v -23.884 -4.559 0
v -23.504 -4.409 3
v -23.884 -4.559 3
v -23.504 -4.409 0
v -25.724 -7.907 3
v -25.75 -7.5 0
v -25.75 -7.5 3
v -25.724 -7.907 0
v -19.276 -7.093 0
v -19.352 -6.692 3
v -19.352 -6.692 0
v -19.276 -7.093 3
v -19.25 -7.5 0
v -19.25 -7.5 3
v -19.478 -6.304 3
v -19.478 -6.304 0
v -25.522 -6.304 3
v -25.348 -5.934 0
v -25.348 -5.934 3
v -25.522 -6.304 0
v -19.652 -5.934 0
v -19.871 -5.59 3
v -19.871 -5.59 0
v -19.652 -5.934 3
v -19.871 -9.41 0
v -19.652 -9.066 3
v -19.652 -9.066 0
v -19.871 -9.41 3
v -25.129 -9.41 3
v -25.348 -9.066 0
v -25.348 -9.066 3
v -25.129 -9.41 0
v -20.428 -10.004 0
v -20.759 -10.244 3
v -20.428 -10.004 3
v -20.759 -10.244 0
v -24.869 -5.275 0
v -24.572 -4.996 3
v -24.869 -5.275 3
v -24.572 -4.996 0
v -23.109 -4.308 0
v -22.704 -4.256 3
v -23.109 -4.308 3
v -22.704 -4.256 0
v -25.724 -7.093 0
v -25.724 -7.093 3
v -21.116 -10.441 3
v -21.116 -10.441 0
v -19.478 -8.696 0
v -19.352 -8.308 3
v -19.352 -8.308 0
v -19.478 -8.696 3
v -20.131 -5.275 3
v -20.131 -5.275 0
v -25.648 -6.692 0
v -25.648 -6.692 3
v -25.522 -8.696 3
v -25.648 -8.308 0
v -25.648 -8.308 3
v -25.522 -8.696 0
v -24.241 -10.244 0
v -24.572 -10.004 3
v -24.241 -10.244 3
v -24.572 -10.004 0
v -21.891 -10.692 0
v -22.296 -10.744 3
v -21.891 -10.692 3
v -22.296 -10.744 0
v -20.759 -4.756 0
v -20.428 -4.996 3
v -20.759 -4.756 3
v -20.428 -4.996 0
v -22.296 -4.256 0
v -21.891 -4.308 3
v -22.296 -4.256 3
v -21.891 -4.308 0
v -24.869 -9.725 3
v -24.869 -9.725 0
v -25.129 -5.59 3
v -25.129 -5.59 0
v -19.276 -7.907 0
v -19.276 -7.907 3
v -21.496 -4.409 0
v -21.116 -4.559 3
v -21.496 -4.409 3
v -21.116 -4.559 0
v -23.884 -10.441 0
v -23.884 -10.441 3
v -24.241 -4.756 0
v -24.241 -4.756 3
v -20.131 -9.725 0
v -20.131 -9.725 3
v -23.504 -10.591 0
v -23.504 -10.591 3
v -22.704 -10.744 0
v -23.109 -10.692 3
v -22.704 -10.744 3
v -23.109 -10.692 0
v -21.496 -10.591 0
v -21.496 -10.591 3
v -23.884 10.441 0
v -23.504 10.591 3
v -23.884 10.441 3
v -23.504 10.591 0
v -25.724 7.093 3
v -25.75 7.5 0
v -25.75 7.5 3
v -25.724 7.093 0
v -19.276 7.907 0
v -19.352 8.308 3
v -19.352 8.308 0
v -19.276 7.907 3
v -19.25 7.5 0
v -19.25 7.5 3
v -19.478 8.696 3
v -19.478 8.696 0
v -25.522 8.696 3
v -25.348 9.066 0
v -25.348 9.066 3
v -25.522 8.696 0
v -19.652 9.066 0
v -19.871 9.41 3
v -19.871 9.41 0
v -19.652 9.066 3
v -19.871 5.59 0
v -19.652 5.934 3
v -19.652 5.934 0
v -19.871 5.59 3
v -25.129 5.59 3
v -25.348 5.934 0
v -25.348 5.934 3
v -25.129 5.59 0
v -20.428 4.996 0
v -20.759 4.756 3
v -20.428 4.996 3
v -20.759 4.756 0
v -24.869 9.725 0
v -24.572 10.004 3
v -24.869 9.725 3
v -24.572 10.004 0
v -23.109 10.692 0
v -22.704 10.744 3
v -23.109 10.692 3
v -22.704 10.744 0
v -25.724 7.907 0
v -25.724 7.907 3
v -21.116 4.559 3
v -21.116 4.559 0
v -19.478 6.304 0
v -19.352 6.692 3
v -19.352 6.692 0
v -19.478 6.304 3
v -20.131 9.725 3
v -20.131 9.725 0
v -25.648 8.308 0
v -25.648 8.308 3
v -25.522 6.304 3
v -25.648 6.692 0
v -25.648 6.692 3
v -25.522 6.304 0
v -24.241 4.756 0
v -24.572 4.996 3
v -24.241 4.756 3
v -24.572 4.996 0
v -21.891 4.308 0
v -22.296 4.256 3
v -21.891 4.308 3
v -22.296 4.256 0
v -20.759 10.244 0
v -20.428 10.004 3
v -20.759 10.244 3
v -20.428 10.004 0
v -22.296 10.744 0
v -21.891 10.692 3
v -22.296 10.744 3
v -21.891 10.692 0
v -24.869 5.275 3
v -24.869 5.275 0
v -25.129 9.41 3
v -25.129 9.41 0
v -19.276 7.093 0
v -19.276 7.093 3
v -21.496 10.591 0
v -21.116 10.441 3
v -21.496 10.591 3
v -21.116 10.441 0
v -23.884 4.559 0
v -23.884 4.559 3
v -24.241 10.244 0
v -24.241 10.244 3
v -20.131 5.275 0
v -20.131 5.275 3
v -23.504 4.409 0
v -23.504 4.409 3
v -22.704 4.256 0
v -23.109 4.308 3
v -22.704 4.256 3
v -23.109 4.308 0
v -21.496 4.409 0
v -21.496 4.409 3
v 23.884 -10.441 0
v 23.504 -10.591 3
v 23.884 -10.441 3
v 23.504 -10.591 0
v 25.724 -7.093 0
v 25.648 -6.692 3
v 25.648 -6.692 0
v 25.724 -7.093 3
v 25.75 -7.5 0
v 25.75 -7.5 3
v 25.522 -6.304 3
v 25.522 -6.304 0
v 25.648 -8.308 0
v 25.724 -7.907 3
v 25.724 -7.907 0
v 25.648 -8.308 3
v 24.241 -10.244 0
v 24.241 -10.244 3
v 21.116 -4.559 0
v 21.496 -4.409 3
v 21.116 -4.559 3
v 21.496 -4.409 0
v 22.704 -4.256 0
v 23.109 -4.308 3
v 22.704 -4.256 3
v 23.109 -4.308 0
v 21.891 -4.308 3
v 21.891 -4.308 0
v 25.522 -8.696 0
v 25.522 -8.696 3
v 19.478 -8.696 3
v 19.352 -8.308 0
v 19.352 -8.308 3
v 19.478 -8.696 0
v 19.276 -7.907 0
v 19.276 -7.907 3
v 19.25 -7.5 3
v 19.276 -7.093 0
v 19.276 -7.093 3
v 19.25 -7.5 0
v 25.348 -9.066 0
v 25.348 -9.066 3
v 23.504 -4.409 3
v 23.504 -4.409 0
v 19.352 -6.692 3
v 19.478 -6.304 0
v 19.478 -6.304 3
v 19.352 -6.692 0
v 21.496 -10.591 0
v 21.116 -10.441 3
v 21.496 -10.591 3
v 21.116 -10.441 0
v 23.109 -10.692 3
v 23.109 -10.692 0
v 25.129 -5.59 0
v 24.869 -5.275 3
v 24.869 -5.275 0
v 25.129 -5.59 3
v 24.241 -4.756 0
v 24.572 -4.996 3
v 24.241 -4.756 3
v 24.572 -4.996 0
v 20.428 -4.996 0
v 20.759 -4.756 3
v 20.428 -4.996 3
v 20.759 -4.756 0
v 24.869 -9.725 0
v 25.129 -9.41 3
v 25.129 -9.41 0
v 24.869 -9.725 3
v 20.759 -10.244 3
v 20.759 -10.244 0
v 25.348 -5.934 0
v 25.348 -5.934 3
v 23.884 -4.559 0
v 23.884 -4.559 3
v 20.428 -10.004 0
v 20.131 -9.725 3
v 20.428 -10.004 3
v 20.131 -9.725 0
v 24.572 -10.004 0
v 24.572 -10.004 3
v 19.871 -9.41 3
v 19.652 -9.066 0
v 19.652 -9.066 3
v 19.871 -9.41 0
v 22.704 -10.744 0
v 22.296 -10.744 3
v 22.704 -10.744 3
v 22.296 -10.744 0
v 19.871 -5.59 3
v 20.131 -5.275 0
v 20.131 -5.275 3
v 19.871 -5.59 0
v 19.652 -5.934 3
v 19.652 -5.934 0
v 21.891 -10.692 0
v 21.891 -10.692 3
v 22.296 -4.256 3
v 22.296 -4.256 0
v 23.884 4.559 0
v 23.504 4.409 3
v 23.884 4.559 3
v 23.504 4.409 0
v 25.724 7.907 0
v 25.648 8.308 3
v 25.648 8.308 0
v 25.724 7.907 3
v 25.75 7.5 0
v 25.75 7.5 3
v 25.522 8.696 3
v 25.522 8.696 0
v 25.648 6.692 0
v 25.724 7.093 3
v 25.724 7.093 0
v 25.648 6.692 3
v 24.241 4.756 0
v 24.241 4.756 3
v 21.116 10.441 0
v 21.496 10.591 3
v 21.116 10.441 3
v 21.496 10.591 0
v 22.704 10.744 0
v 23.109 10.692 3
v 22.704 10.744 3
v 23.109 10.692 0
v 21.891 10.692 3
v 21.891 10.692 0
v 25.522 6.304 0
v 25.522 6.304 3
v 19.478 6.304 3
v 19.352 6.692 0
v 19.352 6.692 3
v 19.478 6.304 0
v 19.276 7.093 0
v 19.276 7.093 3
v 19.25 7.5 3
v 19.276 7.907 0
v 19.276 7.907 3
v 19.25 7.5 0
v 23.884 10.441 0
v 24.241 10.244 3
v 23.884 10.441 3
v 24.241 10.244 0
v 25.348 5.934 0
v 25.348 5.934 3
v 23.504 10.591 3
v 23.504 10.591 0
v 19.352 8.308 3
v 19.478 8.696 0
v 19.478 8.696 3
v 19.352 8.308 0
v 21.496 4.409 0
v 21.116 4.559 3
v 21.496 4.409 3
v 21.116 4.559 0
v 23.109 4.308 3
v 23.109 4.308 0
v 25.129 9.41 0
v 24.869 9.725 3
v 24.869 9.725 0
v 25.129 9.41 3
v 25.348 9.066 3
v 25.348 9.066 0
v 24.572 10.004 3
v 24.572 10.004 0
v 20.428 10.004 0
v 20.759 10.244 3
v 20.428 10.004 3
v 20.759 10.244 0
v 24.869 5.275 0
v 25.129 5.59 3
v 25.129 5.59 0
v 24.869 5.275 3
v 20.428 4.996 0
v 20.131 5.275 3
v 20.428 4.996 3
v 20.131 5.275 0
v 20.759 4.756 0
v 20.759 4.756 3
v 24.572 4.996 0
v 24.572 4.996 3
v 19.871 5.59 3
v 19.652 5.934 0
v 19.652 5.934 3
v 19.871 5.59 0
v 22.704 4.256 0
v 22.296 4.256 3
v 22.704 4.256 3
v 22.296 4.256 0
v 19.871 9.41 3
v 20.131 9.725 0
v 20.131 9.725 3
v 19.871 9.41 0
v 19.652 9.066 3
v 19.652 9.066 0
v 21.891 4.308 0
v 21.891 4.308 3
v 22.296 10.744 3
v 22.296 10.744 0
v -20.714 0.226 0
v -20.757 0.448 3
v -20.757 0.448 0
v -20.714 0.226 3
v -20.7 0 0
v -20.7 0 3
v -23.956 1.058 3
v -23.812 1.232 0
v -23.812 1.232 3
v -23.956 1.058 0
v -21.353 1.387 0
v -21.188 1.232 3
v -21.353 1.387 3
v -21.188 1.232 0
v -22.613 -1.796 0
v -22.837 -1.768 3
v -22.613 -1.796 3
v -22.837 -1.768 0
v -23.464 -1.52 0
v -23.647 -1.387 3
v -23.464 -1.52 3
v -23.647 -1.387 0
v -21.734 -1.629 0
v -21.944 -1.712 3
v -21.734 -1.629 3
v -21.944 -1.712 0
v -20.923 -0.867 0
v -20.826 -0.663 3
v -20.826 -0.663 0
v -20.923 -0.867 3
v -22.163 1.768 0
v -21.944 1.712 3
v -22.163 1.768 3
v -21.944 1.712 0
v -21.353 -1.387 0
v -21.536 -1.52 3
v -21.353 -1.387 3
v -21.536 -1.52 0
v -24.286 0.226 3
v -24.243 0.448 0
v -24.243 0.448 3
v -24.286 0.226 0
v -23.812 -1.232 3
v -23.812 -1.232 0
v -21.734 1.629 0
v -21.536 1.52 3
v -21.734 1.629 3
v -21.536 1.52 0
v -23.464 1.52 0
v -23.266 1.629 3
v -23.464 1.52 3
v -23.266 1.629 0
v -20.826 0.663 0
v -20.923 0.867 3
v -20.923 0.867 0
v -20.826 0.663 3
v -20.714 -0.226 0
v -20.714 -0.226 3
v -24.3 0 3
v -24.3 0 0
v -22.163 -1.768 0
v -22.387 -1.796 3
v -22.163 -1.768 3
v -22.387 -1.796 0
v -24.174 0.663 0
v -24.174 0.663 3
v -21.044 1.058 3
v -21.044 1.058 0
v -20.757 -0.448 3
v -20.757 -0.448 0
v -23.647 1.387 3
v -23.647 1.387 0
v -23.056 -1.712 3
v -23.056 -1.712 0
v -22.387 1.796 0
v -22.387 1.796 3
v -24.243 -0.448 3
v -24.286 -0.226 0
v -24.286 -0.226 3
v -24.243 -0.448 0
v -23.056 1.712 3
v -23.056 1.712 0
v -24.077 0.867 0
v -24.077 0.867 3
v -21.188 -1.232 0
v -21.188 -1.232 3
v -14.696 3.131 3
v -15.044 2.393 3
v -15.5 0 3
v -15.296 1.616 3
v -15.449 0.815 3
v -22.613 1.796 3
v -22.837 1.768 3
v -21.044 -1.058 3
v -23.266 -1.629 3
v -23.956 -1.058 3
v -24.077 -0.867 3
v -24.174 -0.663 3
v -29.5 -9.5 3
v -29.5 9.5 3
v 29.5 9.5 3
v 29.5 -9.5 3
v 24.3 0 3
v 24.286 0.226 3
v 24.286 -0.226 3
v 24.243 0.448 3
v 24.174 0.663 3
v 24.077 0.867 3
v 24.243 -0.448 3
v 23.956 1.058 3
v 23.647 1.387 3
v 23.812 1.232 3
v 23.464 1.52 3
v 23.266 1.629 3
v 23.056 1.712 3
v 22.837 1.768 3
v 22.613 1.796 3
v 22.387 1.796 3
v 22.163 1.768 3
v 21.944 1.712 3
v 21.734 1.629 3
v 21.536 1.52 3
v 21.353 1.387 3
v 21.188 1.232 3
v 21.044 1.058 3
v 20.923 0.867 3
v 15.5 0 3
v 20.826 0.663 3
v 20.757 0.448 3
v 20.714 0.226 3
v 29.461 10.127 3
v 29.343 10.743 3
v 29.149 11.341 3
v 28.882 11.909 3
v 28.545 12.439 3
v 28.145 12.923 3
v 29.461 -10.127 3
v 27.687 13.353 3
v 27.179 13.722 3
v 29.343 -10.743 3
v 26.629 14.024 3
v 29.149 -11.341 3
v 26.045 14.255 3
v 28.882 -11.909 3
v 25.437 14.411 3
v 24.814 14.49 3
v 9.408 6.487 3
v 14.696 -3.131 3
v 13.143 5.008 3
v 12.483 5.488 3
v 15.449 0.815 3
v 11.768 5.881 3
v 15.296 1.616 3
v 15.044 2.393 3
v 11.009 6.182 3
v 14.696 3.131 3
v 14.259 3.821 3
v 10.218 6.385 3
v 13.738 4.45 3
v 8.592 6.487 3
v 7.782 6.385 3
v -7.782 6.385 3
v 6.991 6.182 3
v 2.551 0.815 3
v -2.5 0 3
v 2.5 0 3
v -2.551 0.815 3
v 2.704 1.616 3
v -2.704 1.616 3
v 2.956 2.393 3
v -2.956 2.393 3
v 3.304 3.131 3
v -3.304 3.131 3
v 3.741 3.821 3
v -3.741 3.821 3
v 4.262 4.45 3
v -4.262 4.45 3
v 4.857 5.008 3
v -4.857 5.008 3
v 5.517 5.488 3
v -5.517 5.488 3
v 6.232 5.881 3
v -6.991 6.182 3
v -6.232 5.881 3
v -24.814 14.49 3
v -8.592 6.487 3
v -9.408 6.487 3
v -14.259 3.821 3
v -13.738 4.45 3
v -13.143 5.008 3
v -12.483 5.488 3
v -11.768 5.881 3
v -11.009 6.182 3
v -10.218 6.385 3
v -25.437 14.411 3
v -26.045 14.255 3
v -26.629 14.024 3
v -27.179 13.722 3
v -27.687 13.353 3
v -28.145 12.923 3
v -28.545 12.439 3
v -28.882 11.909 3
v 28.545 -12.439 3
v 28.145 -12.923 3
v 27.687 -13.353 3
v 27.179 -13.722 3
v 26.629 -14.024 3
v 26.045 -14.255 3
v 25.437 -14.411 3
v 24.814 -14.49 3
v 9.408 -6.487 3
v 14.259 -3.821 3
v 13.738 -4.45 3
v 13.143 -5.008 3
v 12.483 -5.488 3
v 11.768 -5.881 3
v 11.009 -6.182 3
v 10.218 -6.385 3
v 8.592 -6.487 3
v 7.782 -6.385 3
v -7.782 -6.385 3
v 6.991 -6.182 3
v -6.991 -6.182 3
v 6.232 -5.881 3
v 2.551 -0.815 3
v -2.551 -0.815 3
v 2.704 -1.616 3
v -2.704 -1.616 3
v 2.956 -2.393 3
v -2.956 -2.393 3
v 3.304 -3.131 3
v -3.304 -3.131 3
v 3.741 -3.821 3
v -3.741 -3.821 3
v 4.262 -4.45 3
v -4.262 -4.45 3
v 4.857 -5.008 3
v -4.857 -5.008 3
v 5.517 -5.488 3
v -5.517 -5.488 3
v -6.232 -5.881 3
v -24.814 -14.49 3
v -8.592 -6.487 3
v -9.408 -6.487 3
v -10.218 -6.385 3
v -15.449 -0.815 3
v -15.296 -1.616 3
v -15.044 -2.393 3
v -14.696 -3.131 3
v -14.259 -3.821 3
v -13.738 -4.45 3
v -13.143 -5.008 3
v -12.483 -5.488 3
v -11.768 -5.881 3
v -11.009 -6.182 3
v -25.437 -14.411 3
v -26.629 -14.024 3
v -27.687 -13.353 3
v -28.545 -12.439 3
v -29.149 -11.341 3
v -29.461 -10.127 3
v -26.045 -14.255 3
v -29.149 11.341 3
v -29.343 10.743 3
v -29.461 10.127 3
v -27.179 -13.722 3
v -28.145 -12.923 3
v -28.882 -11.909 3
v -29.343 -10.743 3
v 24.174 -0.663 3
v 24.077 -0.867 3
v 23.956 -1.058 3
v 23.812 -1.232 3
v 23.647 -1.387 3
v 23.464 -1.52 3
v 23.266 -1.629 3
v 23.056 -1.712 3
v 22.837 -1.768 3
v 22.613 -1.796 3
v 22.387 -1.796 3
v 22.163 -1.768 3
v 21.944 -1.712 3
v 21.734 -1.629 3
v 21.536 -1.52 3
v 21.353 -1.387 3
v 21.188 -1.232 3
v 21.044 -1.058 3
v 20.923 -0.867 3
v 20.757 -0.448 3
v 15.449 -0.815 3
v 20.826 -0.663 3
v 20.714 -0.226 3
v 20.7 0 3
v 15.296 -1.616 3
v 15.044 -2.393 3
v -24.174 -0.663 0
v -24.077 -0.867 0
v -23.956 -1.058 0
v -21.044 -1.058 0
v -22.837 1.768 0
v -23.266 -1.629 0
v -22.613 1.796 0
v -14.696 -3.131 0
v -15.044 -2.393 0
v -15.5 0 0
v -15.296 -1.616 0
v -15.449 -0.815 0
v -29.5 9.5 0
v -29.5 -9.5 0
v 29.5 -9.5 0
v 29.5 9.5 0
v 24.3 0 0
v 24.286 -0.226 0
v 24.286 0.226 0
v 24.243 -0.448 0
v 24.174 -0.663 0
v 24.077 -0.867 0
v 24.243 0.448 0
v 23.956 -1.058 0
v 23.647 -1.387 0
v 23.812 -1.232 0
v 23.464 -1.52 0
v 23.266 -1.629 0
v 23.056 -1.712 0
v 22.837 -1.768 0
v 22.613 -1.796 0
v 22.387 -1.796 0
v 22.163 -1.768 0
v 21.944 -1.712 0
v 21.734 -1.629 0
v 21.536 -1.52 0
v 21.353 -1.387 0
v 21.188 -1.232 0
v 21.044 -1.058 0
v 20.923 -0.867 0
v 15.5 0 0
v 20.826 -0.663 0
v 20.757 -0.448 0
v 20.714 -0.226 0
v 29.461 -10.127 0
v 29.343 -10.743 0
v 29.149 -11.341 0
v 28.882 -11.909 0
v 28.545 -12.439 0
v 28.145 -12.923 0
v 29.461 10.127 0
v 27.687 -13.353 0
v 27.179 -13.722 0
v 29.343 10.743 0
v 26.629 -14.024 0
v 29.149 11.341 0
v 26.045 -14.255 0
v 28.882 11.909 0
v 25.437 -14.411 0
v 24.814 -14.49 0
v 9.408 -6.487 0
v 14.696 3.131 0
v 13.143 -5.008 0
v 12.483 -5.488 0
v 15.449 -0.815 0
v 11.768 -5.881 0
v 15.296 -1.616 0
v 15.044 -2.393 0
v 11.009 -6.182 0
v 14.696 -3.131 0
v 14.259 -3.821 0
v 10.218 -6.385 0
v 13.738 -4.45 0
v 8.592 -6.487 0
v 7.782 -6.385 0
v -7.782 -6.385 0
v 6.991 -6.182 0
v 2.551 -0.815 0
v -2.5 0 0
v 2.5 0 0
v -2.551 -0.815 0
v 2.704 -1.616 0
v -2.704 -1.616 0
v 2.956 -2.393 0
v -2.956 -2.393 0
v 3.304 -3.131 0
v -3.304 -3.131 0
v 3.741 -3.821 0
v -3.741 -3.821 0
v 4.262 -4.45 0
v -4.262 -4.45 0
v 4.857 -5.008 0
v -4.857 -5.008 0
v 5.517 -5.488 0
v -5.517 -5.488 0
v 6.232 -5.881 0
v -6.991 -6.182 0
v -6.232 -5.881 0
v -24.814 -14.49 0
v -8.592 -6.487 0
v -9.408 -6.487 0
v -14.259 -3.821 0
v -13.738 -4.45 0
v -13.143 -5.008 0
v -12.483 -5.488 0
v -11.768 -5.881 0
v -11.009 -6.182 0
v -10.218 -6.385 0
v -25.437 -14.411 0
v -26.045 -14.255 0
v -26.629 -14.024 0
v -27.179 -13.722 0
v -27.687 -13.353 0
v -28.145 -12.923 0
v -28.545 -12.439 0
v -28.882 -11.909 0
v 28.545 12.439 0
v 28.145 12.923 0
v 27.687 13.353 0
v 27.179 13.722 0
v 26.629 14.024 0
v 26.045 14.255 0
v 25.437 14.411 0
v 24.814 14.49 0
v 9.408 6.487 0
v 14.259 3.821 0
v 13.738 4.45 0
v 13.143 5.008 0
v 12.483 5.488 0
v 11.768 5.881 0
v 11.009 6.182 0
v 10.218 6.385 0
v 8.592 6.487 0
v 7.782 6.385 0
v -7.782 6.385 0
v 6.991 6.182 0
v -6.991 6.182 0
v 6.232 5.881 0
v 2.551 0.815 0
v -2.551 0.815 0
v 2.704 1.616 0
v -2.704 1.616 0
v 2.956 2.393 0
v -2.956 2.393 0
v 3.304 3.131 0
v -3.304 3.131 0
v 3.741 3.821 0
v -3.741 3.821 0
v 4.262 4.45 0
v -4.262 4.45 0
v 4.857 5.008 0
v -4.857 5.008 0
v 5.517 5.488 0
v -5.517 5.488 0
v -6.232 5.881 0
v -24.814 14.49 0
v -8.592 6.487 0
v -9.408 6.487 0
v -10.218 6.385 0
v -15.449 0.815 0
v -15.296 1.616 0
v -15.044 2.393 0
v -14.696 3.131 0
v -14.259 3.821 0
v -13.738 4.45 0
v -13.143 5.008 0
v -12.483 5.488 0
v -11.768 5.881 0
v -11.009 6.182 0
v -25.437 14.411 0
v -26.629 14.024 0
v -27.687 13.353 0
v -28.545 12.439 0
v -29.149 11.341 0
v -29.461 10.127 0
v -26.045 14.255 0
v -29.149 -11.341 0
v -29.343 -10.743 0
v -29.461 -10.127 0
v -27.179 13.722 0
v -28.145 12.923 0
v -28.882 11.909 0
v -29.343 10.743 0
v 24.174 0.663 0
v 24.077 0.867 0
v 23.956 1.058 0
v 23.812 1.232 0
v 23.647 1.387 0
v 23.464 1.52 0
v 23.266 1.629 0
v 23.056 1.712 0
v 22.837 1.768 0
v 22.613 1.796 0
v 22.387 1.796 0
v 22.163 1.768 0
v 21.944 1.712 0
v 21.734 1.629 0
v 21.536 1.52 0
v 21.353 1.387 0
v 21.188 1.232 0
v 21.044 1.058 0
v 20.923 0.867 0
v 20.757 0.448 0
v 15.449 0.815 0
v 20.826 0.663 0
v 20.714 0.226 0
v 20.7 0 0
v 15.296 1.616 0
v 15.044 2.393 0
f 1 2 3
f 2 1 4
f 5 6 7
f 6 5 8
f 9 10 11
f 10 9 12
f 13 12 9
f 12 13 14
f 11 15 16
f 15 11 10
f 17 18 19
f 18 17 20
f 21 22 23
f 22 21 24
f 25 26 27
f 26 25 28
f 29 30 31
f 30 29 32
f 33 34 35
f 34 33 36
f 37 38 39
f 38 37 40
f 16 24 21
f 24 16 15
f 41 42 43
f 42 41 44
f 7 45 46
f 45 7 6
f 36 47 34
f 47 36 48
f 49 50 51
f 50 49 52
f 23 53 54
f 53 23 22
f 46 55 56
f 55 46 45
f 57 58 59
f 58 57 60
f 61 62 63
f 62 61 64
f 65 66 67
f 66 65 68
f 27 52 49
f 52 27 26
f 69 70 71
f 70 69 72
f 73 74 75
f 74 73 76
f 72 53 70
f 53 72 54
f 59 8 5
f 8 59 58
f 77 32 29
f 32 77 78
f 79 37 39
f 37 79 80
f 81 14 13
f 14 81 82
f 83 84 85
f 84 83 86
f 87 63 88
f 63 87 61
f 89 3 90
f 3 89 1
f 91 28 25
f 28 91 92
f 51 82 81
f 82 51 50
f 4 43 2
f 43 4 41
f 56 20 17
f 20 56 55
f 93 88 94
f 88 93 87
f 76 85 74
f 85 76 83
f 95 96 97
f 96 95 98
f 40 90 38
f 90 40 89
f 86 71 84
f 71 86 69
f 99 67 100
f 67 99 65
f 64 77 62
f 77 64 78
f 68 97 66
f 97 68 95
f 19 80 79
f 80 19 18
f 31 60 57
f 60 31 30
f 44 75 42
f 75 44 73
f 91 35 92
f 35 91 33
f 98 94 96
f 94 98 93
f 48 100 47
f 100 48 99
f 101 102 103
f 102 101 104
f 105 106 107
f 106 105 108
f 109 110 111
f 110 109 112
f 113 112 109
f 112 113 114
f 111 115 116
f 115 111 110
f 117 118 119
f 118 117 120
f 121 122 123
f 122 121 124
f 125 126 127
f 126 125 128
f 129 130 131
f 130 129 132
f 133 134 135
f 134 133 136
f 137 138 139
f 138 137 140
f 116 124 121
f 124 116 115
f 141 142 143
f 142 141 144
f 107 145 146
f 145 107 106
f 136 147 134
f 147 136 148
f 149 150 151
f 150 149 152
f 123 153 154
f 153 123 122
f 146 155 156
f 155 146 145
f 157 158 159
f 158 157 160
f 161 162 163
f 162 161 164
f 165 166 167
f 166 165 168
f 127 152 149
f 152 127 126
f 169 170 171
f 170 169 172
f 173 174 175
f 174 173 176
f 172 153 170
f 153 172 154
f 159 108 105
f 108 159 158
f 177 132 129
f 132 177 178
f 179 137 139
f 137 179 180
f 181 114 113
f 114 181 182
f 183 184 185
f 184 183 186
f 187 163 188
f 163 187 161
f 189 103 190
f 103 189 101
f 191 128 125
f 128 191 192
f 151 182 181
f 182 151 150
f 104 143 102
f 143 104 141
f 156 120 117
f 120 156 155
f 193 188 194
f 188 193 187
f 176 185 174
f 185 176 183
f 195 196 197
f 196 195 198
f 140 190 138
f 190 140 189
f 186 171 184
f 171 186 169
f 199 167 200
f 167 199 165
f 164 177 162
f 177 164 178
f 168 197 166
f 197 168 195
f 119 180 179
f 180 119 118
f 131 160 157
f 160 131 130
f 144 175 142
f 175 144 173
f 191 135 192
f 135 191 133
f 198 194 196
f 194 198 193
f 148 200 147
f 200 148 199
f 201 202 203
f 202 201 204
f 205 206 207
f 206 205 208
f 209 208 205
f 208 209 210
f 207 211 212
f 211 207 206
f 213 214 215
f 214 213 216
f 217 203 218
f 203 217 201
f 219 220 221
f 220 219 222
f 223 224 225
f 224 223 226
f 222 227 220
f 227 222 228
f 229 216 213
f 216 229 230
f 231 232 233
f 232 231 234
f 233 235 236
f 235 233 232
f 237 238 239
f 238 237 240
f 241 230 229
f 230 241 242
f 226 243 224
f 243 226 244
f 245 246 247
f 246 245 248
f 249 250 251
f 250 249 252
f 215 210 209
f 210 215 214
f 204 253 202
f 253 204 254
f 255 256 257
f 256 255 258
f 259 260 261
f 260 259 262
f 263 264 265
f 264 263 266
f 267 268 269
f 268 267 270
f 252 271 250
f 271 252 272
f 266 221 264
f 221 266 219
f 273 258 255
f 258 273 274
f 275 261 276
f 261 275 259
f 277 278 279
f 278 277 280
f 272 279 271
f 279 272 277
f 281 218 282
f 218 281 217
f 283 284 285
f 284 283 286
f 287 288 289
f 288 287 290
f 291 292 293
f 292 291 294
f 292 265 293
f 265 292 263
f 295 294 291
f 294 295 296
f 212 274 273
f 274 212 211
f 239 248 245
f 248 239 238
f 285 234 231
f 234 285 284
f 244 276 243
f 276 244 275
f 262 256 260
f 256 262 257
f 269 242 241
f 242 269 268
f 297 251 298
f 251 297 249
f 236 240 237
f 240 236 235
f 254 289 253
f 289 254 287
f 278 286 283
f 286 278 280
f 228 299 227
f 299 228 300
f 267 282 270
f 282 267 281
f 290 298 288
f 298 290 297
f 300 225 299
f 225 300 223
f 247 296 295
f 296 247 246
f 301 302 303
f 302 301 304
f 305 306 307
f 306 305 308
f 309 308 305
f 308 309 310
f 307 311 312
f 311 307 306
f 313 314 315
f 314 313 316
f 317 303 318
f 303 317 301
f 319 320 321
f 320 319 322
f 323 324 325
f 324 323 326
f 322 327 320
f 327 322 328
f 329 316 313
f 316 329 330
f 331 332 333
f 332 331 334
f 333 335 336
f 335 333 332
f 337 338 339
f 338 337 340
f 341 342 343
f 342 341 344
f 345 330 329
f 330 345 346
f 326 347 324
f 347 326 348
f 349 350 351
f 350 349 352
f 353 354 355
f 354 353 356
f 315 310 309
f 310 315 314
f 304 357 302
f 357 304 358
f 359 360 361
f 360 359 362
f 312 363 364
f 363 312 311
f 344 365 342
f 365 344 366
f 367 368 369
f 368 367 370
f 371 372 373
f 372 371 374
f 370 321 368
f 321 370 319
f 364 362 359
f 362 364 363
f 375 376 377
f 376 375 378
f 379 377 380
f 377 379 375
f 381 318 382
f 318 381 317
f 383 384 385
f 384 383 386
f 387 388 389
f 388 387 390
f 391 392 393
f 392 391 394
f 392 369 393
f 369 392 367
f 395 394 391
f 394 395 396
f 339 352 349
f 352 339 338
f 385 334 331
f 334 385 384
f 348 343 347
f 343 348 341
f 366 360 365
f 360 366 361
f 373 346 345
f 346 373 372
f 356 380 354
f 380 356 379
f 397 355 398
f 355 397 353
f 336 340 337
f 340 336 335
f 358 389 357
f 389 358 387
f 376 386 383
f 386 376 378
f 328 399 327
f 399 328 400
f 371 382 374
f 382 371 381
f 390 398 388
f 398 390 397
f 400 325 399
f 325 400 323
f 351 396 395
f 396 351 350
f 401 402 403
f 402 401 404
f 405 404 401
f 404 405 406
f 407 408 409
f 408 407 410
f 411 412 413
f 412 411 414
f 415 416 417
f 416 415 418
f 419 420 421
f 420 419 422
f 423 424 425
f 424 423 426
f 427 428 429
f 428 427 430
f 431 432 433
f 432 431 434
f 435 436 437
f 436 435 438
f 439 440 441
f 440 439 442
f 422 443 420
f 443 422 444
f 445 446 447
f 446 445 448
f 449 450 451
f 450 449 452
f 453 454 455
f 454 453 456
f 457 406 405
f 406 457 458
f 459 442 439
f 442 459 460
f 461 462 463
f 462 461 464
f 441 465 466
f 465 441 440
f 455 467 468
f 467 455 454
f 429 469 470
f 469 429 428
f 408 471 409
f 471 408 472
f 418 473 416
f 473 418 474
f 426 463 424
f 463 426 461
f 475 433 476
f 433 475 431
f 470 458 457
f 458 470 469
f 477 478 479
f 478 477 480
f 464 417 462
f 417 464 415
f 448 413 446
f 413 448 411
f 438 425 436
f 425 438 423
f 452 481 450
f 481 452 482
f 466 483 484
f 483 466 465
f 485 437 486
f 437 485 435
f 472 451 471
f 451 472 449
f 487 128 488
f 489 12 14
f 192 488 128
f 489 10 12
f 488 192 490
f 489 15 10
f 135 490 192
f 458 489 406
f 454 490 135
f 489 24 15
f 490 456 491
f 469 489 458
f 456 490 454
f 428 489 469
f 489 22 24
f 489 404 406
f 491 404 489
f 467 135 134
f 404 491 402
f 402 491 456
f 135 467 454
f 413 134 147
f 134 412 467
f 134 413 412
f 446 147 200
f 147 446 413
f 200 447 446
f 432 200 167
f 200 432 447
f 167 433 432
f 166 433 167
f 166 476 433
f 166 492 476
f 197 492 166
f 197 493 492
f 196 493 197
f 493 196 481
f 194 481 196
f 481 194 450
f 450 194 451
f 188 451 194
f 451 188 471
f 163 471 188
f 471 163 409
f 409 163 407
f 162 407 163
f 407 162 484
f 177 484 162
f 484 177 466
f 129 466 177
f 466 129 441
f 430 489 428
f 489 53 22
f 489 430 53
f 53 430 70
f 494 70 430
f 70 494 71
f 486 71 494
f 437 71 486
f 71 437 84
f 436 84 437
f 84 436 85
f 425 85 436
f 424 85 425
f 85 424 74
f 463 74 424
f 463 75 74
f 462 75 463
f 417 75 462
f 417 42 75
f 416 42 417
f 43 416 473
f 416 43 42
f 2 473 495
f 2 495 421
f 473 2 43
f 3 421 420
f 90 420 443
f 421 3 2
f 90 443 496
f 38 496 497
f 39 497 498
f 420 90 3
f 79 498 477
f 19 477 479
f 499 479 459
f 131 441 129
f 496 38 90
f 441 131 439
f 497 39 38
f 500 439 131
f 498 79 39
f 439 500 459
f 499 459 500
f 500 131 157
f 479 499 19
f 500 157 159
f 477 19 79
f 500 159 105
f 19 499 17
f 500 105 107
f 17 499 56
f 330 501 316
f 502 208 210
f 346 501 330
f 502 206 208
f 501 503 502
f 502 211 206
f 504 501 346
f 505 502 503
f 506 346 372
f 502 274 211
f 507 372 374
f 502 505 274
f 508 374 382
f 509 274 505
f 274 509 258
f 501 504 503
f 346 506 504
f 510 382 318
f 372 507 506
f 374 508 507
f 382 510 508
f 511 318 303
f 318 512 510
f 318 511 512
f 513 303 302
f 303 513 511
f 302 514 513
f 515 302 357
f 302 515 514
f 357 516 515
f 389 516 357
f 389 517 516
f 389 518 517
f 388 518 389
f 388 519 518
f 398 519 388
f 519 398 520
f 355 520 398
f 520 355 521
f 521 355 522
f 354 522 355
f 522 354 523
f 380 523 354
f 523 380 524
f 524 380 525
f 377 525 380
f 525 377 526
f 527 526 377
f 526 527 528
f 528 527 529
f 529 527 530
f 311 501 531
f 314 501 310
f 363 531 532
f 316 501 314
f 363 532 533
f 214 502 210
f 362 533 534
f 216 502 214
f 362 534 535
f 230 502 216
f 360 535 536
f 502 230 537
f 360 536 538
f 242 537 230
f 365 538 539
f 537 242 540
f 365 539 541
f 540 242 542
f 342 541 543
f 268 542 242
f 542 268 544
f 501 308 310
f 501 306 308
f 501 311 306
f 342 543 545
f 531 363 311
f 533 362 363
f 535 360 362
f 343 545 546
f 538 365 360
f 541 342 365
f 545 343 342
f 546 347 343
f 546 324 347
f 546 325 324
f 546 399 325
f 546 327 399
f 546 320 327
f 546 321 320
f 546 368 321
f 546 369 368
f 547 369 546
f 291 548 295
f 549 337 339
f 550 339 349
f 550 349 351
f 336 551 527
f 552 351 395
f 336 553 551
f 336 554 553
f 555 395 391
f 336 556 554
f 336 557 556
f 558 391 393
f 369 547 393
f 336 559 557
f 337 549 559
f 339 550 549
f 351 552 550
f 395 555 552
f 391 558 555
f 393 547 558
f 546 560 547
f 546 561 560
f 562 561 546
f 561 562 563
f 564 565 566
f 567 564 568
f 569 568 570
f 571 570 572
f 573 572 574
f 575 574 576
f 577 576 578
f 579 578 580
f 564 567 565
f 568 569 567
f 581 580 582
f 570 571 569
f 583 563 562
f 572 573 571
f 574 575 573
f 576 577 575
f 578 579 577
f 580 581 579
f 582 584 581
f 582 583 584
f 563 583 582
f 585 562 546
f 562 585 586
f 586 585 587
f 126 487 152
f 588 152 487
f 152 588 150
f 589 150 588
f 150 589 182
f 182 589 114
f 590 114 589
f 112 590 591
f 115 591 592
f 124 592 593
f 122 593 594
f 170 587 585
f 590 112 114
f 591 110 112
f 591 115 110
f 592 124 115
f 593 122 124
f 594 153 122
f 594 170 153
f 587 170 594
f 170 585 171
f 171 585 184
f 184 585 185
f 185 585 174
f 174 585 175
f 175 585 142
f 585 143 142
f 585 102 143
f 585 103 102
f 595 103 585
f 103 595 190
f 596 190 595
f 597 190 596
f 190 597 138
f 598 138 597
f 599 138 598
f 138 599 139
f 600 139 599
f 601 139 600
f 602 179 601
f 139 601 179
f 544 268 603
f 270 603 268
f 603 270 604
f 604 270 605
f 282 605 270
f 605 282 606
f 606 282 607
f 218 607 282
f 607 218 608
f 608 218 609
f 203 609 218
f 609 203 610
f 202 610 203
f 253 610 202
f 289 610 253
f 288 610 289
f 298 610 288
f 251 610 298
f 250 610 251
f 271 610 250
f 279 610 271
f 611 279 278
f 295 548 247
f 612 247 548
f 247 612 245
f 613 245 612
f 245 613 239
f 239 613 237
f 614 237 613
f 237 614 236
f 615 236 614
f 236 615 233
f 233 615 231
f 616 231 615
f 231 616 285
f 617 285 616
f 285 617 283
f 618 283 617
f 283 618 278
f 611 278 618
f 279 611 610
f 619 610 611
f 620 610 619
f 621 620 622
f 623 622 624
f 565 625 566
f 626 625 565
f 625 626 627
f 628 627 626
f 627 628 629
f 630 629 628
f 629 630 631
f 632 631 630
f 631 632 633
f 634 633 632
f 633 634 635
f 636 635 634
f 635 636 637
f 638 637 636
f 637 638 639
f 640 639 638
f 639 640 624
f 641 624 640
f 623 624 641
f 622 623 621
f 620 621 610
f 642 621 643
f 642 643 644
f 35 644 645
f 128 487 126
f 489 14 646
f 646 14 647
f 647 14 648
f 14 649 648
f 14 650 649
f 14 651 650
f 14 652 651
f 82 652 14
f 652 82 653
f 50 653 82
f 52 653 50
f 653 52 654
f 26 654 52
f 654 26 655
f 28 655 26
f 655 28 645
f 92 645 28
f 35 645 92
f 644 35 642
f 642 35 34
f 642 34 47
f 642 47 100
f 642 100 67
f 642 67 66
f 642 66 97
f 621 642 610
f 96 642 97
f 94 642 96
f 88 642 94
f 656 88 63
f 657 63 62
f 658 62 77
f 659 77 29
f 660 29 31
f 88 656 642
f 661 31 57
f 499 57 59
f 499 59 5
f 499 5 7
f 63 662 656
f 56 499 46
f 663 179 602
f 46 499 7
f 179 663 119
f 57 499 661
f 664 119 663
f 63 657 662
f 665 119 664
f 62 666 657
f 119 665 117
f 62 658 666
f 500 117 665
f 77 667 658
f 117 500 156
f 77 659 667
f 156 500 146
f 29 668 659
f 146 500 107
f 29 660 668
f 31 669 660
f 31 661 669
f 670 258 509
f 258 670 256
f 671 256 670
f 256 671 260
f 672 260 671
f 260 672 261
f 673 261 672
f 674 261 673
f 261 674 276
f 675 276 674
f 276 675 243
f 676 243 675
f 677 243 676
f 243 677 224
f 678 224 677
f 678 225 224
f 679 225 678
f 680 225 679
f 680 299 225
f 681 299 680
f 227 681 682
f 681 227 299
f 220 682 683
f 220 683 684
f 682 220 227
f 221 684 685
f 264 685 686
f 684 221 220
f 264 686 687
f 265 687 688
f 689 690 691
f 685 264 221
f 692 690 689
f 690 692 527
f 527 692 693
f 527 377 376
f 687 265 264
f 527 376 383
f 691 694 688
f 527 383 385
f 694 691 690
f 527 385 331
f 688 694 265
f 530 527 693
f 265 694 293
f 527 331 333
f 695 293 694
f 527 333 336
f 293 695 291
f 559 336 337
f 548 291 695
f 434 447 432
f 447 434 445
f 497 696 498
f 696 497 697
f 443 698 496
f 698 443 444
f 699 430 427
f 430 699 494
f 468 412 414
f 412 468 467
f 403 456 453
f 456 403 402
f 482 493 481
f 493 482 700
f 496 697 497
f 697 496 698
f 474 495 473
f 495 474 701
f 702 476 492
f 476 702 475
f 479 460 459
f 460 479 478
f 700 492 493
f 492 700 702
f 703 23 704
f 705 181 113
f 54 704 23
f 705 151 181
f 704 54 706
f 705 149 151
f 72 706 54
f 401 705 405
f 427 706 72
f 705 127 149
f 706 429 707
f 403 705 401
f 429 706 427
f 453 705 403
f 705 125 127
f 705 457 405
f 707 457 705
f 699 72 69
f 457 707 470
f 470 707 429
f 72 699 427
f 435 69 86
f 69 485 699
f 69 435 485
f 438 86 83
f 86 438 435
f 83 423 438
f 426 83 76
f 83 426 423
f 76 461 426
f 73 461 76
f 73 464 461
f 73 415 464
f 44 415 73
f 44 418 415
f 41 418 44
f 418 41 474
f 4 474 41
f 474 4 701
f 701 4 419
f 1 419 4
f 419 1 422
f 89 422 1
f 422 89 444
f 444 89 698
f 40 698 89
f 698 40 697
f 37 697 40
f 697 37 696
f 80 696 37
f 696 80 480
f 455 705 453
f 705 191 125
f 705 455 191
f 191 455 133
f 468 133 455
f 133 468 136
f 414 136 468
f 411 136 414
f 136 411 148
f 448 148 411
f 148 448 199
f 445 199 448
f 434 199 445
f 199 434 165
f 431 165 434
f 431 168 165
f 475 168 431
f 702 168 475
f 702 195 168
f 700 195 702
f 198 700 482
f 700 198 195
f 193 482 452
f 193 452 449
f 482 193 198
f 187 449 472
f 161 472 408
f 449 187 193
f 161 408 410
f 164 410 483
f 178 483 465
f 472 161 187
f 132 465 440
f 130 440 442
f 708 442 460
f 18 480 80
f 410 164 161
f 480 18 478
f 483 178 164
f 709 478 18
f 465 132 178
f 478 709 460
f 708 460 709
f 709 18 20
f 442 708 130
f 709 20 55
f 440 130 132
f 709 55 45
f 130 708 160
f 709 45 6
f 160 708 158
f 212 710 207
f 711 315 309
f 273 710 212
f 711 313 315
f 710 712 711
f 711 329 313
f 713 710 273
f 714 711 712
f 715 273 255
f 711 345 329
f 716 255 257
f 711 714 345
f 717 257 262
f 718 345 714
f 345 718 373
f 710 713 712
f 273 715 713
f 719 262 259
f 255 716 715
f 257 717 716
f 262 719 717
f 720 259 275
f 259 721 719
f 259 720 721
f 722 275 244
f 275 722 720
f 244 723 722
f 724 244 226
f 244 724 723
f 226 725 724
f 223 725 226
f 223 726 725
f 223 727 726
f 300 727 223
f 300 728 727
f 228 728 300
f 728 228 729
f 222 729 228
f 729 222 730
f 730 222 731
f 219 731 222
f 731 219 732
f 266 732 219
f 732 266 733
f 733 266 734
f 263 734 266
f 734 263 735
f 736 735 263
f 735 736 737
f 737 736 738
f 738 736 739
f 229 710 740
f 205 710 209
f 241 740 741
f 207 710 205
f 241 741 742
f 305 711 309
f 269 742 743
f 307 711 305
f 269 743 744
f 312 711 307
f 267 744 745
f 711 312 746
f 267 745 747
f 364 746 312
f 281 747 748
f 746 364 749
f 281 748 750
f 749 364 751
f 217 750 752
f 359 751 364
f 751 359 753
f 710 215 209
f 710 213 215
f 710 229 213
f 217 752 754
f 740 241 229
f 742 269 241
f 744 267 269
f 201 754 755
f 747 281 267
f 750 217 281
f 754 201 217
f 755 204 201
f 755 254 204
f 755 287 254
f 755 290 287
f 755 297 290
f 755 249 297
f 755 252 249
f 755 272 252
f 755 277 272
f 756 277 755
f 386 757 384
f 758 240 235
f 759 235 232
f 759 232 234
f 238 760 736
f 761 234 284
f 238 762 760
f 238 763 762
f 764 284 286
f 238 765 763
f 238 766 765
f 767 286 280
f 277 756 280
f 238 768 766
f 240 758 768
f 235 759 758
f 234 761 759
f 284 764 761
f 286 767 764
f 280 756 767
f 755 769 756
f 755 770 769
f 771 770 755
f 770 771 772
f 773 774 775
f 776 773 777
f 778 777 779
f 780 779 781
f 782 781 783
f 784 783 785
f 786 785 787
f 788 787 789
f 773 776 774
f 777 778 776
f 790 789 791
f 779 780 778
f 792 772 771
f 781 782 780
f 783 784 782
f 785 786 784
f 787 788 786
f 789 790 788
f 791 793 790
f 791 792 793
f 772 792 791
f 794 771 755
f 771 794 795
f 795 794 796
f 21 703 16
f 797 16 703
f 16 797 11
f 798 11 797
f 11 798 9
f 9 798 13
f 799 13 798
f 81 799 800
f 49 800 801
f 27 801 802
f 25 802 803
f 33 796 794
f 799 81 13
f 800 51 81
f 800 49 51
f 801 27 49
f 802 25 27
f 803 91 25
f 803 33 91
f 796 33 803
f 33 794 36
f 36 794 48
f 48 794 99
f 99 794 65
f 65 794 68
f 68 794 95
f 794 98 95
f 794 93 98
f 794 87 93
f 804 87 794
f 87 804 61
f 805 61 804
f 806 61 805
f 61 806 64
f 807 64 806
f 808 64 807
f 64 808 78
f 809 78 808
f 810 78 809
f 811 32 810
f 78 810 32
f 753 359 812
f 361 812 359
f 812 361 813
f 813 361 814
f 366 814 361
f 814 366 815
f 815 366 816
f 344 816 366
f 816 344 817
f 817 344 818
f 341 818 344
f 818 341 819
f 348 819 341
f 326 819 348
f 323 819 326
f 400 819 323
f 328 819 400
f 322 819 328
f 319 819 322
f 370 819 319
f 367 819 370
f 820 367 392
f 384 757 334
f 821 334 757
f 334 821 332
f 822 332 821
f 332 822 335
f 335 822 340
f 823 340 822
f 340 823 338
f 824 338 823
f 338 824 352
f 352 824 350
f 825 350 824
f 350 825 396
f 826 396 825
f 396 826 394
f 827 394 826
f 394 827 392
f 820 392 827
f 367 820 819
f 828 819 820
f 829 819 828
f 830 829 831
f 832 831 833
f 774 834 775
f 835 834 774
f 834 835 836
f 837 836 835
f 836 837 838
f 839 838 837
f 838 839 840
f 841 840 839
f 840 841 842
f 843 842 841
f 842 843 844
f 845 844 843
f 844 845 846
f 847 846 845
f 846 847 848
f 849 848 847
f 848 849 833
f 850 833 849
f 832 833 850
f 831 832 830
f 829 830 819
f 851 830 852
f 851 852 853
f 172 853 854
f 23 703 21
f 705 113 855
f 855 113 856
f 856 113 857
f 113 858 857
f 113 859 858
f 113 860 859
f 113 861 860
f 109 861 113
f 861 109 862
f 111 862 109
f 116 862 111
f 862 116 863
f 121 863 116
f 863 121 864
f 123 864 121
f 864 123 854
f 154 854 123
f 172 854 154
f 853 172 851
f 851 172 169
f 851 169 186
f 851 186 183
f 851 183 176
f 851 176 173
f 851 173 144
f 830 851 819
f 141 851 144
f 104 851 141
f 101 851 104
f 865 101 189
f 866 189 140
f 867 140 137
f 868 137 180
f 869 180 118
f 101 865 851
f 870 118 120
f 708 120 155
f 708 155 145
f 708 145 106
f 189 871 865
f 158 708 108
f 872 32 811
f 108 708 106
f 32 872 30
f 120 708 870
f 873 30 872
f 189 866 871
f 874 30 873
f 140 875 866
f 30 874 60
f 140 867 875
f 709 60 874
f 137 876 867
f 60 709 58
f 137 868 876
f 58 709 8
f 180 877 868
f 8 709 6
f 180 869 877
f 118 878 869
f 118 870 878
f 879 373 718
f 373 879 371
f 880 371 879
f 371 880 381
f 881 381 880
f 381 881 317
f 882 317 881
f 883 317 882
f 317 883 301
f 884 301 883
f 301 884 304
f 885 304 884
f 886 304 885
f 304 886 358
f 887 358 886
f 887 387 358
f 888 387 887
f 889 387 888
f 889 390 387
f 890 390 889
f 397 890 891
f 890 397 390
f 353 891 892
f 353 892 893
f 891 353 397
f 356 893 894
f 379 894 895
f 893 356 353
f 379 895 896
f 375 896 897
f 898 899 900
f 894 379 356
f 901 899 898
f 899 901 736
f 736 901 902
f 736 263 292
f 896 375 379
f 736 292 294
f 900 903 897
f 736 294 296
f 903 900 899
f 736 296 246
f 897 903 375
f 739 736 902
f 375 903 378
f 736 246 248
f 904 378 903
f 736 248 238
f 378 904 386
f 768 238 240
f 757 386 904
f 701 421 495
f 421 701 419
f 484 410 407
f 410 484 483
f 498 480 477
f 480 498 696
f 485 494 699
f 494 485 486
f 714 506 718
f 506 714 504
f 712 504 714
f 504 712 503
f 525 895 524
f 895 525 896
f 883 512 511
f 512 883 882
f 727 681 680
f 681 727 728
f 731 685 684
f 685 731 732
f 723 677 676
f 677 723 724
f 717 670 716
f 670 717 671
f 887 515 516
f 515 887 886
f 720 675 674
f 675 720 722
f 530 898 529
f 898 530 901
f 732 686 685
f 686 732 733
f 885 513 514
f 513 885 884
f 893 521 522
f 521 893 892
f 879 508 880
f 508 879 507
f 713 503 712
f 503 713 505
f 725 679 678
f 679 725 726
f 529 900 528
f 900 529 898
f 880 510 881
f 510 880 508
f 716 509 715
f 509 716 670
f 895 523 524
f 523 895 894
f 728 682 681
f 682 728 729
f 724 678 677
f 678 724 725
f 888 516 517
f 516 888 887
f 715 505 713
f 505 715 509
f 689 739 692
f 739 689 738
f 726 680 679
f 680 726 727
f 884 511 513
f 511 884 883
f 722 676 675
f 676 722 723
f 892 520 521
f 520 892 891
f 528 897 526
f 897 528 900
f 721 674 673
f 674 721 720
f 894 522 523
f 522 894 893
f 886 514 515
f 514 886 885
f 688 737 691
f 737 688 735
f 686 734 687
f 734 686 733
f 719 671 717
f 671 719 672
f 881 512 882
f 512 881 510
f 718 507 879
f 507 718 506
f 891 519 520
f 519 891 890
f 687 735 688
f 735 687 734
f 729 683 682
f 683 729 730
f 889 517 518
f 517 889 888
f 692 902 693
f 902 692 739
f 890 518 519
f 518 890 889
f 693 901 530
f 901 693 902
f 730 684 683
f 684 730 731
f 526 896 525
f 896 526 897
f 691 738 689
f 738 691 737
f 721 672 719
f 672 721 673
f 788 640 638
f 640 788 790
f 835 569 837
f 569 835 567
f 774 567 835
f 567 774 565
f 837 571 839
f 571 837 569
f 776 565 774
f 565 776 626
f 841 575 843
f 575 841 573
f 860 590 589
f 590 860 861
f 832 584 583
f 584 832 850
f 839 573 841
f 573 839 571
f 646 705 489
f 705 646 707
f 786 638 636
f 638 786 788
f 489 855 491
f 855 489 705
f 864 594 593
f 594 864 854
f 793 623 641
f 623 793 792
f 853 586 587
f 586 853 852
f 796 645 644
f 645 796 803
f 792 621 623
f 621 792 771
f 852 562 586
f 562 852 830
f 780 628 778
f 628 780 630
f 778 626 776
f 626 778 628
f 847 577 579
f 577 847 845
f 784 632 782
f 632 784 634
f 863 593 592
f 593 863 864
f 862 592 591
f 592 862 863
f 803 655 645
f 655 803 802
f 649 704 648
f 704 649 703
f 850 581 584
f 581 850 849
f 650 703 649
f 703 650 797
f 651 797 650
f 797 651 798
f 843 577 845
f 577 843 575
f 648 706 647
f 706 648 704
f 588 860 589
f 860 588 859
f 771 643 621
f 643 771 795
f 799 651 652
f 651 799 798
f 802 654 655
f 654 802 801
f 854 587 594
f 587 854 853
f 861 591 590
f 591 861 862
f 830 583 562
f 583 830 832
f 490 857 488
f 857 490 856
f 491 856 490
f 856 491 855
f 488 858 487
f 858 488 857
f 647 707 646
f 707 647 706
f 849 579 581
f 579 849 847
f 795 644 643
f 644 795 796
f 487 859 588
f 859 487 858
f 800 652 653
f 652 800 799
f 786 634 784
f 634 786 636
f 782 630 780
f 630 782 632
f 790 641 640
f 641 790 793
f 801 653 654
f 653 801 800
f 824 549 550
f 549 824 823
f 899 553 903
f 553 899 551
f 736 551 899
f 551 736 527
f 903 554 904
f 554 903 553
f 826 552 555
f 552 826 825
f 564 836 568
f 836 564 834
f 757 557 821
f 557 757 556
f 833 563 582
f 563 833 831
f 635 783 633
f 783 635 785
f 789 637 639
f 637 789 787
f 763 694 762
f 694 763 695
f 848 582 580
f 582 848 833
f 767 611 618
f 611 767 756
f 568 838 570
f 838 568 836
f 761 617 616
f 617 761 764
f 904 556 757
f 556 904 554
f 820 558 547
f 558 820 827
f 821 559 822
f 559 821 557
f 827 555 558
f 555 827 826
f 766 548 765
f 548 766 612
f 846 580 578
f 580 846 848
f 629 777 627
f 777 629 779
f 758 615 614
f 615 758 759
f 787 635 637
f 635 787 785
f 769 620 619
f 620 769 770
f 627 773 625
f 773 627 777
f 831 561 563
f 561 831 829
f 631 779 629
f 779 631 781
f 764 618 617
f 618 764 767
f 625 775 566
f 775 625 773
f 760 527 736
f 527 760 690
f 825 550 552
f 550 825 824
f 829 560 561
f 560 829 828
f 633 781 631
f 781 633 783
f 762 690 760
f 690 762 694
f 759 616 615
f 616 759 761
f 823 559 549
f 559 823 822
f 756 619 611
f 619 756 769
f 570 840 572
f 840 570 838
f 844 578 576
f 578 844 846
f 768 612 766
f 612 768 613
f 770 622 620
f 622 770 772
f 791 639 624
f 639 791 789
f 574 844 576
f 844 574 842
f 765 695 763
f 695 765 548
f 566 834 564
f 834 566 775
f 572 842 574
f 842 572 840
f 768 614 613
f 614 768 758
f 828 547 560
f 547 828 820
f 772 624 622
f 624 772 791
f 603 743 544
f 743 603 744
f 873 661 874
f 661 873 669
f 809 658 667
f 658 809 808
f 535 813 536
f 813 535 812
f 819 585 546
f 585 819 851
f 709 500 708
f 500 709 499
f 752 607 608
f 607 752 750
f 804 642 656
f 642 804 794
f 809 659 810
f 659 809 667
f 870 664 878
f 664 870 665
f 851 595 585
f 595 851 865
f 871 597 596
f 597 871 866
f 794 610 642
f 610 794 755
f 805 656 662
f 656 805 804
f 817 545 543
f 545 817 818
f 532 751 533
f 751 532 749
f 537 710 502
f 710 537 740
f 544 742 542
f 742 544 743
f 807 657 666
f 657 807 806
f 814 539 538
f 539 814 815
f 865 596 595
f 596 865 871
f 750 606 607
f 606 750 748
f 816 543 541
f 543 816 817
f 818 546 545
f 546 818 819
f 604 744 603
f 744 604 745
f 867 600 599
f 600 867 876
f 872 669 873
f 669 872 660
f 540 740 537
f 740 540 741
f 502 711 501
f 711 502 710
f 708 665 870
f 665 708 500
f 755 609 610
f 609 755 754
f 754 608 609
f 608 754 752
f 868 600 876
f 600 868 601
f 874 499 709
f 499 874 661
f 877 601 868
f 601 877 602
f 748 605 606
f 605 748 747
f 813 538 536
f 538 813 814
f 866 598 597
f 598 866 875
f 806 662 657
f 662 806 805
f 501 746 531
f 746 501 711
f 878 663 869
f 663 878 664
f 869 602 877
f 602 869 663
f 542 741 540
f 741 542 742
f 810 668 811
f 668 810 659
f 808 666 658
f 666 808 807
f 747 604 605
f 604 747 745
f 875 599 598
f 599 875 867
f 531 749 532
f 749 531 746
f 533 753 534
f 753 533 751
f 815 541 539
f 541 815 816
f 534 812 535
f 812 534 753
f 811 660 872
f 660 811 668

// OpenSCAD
$fn = 50;


difference() {
	union() {
		hull() {
			translate(v = [-24.5000000000, 9.5000000000, 0]) {
				cylinder(h = 3, r = 5);
			}
			translate(v = [24.5000000000, 9.5000000000, 0]) {
				cylinder(h = 3, r = 5);
			}
			translate(v = [-24.5000000000, -9.5000000000, 0]) {
				cylinder(h = 3, r = 5);
			}
			translate(v = [24.5000000000, -9.5000000000, 0]) {
				cylinder(h = 3, r = 5);
			}
		}
	}
	union() {
		#translate(v = [-22.5000000000, -7.5000000000, 0]) {
			cylinder(h = 3, r = 3.2500000000);
		}
		#translate(v = [-22.5000000000, 7.5000000000, 0]) {
			cylinder(h = 3, r = 3.2500000000);
		}
		#translate(v = [22.5000000000, -7.5000000000, 0]) {
			cylinder(h = 3, r = 3.2500000000);
		}
		#translate(v = [22.5000000000, 7.5000000000, 0]) {
			cylinder(h = 3, r = 3.2500000000);
		}
		#translate(v = [-22.5000000000, -7.5000000000, -100.0000000000]) {
			cylinder(h = 200, r = 3.2500000000);
		}
		#translate(v = [-22.5000000000, 7.5000000000, -100.0000000000]) {
			cylinder(h = 200, r = 3.2500000000);
		}
		#translate(v = [22.5000000000, -7.5000000000, -100.0000000000]) {
			cylinder(h = 200, r = 3.2500000000);
		}
		#translate(v = [22.5000000000, 7.5000000000, -100.0000000000]) {
			cylinder(h = 200, r = 3.2500000000);
		}
		#translate(v = [-22.5000000000, -7.5000000000, 0]) {
			cylinder(h = 3, r = 1.8000000000);
		}
		#translate(v = [-22.5000000000, 0.0000000000, 0]) {
			cylinder(h = 3, r = 1.8000000000);
		}
		#translate(v = [-22.5000000000, 7.5000000000, 0]) {
			cylinder(h = 3, r = 1.8000000000);
		}
		#translate(v = [22.5000000000, -7.5000000000, 0]) {
			cylinder(h = 3, r = 1.8000000000);
		}
		#translate(v = [22.5000000000, 0.0000000000, 0]) {
			cylinder(h = 3, r = 1.8000000000);
		}
		#translate(v = [22.5000000000, 7.5000000000, 0]) {
			cylinder(h = 3, r = 1.8000000000);
		}
		#translate(v = [-22.5000000000, -7.5000000000, 0]) {
			cylinder(h = 3, r = 1.8000000000);
		}
		#translate(v = [-22.5000000000, 0.0000000000, 0]) {
			cylinder(h = 3, r = 1.8000000000);
		}
		#translate(v = [-22.5000000000, 7.5000000000, 0]) {
			cylinder(h = 3, r = 1.8000000000);
		}
		#translate(v = [22.5000000000, -7.5000000000, 0]) {
			cylinder(h = 3, r = 1.8000000000);
		}
		#translate(v = [22.5000000000, 0.0000000000, 0]) {
			cylinder(h = 3, r = 1.8000000000);
		}
		#translate(v = [22.5000000000, 7.5000000000, 0]) {
			cylinder(h = 3, r = 1.8000000000);
		}
		#translate(v = [-22.5000000000, -7.5000000000, 0]) {
			cylinder(h = 3, r = 1.8000000000);
		}
		#translate(v = [-22.5000000000, 0.0000000000, 0]) {
			cylinder(h = 3, r = 1.8000000000);
		}
		#translate(v = [-22.5000000000, 7.5000000000, 0]) {
			cylinder(h = 3, r = 1.8000000000);
		}
		#translate(v = [22.5000000000, -7.5000000000, 0]) {
			cylinder(h = 3, r = 1.8000000000);
		}
		#translate(v = [22.5000000000, 0.0000000000, 0]) {
			cylinder(h = 3, r = 1.8000000000);
		}
		#translate(v = [22.5000000000, 7.5000000000, 0]) {
			cylinder(h = 3, r = 1.8000000000);
		}
		#translate(v = [-9.0000000000, 0, 0]) {
			cylinder(h = 3, r = 6.5000000000);
		}
		#translate(v = [9.0000000000, 0, 0]) {
			cylinder(h = 3, r = 6.5000000000);
		}
	}
}
